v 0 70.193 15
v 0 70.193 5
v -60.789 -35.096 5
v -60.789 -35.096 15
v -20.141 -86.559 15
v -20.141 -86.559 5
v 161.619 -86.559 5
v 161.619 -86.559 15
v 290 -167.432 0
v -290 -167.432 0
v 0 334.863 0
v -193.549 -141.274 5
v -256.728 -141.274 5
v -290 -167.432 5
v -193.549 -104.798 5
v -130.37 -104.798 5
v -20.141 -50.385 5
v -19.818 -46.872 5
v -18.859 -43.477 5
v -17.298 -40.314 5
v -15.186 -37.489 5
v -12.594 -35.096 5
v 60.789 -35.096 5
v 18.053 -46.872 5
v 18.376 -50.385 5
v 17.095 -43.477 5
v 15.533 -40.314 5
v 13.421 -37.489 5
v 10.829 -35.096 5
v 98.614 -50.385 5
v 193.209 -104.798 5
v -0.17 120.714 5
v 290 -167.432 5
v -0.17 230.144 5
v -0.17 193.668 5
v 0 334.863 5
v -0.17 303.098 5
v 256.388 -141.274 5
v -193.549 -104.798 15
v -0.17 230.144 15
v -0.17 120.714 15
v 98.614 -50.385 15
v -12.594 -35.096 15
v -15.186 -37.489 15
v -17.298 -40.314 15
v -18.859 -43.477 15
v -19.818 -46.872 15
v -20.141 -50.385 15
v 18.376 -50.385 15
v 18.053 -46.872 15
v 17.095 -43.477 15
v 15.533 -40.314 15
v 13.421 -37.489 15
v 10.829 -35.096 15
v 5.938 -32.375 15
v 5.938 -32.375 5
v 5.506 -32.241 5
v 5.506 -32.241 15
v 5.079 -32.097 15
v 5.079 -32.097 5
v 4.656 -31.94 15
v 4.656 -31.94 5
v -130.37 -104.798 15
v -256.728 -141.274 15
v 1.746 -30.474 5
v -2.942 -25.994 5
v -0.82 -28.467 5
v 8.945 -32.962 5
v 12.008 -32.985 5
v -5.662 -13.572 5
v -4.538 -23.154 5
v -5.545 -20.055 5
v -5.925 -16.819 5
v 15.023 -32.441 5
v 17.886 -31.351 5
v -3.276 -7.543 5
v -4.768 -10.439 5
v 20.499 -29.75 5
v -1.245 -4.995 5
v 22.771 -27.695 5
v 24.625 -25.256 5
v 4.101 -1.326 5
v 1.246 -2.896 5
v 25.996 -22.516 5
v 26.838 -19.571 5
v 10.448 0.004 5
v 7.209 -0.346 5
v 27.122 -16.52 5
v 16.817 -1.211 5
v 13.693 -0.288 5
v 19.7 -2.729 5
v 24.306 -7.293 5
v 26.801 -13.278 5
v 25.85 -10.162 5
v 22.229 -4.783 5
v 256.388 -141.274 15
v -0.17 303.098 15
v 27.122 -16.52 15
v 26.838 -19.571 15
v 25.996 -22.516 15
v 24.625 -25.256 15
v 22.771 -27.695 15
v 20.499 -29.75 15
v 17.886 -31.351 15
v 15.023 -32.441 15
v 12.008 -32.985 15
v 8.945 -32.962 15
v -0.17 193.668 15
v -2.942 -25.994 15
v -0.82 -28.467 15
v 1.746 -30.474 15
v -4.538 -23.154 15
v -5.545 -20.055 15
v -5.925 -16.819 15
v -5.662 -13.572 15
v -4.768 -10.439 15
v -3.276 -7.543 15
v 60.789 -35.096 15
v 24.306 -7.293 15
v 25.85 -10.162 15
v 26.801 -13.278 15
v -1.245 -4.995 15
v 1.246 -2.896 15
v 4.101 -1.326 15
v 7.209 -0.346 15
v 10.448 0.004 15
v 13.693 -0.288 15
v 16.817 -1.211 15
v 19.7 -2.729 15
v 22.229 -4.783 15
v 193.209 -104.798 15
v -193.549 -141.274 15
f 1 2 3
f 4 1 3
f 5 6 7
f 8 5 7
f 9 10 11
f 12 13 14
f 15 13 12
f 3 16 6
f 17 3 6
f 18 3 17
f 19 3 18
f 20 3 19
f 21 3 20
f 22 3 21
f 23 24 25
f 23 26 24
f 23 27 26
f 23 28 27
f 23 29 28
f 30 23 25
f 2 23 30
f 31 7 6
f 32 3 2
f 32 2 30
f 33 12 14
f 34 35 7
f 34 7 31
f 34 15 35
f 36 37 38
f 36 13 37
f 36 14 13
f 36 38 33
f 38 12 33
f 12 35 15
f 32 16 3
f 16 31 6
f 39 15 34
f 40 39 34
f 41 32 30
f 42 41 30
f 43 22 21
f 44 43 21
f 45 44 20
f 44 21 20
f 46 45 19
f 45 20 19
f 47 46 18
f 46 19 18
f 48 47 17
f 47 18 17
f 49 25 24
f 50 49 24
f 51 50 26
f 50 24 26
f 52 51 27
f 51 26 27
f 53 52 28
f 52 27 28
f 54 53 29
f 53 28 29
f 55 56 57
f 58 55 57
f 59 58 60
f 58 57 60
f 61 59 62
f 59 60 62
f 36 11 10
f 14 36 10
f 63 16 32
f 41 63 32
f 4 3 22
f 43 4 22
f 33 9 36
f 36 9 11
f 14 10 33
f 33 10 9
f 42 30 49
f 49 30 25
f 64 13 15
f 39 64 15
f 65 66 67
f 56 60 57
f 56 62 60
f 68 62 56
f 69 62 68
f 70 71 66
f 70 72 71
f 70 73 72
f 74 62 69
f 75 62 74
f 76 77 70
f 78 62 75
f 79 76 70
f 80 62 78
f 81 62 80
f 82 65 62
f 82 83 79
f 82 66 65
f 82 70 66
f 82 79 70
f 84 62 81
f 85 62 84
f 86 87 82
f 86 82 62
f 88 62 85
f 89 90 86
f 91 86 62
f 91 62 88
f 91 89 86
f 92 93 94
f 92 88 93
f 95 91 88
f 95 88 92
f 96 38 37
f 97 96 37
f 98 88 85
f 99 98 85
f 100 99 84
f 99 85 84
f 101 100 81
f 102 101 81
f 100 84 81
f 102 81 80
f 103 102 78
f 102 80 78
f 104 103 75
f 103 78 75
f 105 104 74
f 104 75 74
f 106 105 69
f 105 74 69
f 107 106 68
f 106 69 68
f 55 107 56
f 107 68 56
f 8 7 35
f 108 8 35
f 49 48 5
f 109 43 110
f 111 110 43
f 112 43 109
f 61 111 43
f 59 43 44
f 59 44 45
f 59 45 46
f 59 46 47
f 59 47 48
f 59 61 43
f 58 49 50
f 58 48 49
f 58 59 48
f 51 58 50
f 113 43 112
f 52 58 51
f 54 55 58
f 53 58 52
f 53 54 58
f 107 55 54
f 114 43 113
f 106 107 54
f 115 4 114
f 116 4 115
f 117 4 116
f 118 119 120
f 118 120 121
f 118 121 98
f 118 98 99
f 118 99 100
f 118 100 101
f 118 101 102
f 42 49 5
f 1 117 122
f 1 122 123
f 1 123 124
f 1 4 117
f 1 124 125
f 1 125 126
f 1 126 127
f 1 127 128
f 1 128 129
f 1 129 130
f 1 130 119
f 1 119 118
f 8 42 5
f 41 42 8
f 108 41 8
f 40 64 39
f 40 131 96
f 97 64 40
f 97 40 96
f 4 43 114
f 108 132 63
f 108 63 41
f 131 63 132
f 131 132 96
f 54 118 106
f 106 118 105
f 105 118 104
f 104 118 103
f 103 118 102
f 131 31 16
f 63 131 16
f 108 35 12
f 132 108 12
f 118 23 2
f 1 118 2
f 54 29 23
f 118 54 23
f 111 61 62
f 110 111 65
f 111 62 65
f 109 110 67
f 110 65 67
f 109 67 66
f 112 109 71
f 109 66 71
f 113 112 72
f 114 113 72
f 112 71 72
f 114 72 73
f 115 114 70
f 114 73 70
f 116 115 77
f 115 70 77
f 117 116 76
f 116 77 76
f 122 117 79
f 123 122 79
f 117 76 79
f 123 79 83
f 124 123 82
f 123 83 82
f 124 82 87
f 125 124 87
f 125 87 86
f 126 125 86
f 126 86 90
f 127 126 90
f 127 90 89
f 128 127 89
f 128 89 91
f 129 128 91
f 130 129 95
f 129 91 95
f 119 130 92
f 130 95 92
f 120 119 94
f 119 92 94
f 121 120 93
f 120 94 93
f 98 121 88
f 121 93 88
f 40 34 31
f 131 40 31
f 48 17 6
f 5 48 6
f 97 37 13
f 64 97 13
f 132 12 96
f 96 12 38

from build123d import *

# Parameters (mm, degrees)
F1_DEPTH = 5
F3_DEPTH = 10
F4_DEPTH = 10


# Not quite as in the source:
# - a feature names something its author has since deleted; it is built from what else it names


with BuildPart() as f1:
    # F0 (on Top) → F1 (new body)
    with BuildSketch(Plane.XY):
        Polygon((290, -167.431578065), (0, 334.86315613), (-290, -167.431578065), align=None)
    extrude(amount=F1_DEPTH)

    # F2 (on face) → F3 (join)
    with BuildSketch(Plane.XY.offset(5)):
        with BuildLine():
            Line((256.3882985588, -141.2744761391), (-0.1700333609, 303.0975898508))
            Line((-0.1700333609, 303.0975898508), (-256.7283652805, -141.2744761391))
            Line((-256.7283652805, -141.2744761391), (-193.5489429105, -104.7978196266))
            Line((-193.5489429105, -104.7978196266), (-0.1700333609, 230.1442768257))
            Line((-0.1700333609, 230.1442768257), (193.2088761888, -104.7978196266))
            Line((193.2088761888, -104.7978196266), (-130.3695205406, -104.7978196266))
            Line((-130.3695205406, -104.7978196266), (-0.1700333609, 120.7143072881))
            Line((-0.1700333609, 120.7143072881), (98.6142485835, -50.3850880286))
            Line((98.6142485835, -50.3850880286), (18.3761417155, -50.3850880286))
            ThreePointArc((18.3761417155, -50.3850880286), (16.3865094235, -41.8600549069), (10.8287170908, -35.0964929185))
            Line((10.8287170908, -35.0964929185), (-12.5935137719, -35.0964929185))
            ThreePointArc((-12.5935137719, -35.0964929185), (-18.1513061046, -41.8600549069), (-20.1409383966, -50.3850880286))
            Line((-20.1409383966, -50.3850880286), (-20.1409383966, -86.5594913703))
            Line((-20.1409383966, -86.5594913703), (161.6191650039, -86.5594913703))
            Line((161.6191650039, -86.5594913703), (-0.1700333609, 193.6676203132))
            Line((-0.1700333609, 193.6676203132), (-193.5489429105, -141.2744761391))
            Line((-193.5489429105, -141.2744761391), (256.3882985588, -141.2744761391))
        make_face()
    extrude(amount=F3_DEPTH)

    # F2 (on face) → F4 (join)
    with BuildSketch(Plane.XY.offset(5)):
        with BuildLine():
            Line((-60.7889089023, -35.0964929185), (-12.5935137719, -35.0964929185))
            ThreePointArc((-12.5935137719, -35.0964929185), (-7.065251394, -32.1460175148), (-0.8823983405, -31.1265479726))
            ThreePointArc((-0.8823983405, -31.1265479726), (1.9162643927, -31.3309847436), (4.6555093745, -31.9399547076))
            ThreePointArc((4.6555093745, -31.9399547076), (1.2463845952, -2.8955610808), (27.1223774556, -16.5202418624))
            ThreePointArc((27.1223774556, -16.5202418624), (20.4987699273, -29.7504111213), (5.9377581342, -32.3746235496))
            ThreePointArc((5.9377581342, -32.3746235496), (8.4826511964, -33.5569208004), (10.8287170908, -35.0964929185))
            Line((10.8287170908, -35.0964929185), (60.7889089023, -35.0964929185))
            Line((60.7889089023, -35.0964929185), (0, 70.1929858369))
            Line((0, 70.1929858369), (-60.7889089023, -35.0964929185))
        make_face()
        with BuildLine():
            ThreePointArc((-0.8823983405, -31.1265479726), (-7.065251394, -32.1460175148), (-12.5935137719, -35.0964929185))
            Line((-12.5935137719, -35.0964929185), (10.8287170908, -35.0964929185))
            ThreePointArc((10.8287170908, -35.0964929185), (8.4826511964, -33.5569208004), (5.9377581342, -32.3746235496))
            ThreePointArc((5.9377581342, -32.3746235496), (5.2921802317, -32.1704267711), (4.6555093745, -31.9399547076))
            ThreePointArc((4.6555093745, -31.9399547076), (1.9162643927, -31.3309847436), (-0.8823983405, -31.1265479726))
        make_face()
    extrude(amount=F4_DEPTH)


solid = f1.part
